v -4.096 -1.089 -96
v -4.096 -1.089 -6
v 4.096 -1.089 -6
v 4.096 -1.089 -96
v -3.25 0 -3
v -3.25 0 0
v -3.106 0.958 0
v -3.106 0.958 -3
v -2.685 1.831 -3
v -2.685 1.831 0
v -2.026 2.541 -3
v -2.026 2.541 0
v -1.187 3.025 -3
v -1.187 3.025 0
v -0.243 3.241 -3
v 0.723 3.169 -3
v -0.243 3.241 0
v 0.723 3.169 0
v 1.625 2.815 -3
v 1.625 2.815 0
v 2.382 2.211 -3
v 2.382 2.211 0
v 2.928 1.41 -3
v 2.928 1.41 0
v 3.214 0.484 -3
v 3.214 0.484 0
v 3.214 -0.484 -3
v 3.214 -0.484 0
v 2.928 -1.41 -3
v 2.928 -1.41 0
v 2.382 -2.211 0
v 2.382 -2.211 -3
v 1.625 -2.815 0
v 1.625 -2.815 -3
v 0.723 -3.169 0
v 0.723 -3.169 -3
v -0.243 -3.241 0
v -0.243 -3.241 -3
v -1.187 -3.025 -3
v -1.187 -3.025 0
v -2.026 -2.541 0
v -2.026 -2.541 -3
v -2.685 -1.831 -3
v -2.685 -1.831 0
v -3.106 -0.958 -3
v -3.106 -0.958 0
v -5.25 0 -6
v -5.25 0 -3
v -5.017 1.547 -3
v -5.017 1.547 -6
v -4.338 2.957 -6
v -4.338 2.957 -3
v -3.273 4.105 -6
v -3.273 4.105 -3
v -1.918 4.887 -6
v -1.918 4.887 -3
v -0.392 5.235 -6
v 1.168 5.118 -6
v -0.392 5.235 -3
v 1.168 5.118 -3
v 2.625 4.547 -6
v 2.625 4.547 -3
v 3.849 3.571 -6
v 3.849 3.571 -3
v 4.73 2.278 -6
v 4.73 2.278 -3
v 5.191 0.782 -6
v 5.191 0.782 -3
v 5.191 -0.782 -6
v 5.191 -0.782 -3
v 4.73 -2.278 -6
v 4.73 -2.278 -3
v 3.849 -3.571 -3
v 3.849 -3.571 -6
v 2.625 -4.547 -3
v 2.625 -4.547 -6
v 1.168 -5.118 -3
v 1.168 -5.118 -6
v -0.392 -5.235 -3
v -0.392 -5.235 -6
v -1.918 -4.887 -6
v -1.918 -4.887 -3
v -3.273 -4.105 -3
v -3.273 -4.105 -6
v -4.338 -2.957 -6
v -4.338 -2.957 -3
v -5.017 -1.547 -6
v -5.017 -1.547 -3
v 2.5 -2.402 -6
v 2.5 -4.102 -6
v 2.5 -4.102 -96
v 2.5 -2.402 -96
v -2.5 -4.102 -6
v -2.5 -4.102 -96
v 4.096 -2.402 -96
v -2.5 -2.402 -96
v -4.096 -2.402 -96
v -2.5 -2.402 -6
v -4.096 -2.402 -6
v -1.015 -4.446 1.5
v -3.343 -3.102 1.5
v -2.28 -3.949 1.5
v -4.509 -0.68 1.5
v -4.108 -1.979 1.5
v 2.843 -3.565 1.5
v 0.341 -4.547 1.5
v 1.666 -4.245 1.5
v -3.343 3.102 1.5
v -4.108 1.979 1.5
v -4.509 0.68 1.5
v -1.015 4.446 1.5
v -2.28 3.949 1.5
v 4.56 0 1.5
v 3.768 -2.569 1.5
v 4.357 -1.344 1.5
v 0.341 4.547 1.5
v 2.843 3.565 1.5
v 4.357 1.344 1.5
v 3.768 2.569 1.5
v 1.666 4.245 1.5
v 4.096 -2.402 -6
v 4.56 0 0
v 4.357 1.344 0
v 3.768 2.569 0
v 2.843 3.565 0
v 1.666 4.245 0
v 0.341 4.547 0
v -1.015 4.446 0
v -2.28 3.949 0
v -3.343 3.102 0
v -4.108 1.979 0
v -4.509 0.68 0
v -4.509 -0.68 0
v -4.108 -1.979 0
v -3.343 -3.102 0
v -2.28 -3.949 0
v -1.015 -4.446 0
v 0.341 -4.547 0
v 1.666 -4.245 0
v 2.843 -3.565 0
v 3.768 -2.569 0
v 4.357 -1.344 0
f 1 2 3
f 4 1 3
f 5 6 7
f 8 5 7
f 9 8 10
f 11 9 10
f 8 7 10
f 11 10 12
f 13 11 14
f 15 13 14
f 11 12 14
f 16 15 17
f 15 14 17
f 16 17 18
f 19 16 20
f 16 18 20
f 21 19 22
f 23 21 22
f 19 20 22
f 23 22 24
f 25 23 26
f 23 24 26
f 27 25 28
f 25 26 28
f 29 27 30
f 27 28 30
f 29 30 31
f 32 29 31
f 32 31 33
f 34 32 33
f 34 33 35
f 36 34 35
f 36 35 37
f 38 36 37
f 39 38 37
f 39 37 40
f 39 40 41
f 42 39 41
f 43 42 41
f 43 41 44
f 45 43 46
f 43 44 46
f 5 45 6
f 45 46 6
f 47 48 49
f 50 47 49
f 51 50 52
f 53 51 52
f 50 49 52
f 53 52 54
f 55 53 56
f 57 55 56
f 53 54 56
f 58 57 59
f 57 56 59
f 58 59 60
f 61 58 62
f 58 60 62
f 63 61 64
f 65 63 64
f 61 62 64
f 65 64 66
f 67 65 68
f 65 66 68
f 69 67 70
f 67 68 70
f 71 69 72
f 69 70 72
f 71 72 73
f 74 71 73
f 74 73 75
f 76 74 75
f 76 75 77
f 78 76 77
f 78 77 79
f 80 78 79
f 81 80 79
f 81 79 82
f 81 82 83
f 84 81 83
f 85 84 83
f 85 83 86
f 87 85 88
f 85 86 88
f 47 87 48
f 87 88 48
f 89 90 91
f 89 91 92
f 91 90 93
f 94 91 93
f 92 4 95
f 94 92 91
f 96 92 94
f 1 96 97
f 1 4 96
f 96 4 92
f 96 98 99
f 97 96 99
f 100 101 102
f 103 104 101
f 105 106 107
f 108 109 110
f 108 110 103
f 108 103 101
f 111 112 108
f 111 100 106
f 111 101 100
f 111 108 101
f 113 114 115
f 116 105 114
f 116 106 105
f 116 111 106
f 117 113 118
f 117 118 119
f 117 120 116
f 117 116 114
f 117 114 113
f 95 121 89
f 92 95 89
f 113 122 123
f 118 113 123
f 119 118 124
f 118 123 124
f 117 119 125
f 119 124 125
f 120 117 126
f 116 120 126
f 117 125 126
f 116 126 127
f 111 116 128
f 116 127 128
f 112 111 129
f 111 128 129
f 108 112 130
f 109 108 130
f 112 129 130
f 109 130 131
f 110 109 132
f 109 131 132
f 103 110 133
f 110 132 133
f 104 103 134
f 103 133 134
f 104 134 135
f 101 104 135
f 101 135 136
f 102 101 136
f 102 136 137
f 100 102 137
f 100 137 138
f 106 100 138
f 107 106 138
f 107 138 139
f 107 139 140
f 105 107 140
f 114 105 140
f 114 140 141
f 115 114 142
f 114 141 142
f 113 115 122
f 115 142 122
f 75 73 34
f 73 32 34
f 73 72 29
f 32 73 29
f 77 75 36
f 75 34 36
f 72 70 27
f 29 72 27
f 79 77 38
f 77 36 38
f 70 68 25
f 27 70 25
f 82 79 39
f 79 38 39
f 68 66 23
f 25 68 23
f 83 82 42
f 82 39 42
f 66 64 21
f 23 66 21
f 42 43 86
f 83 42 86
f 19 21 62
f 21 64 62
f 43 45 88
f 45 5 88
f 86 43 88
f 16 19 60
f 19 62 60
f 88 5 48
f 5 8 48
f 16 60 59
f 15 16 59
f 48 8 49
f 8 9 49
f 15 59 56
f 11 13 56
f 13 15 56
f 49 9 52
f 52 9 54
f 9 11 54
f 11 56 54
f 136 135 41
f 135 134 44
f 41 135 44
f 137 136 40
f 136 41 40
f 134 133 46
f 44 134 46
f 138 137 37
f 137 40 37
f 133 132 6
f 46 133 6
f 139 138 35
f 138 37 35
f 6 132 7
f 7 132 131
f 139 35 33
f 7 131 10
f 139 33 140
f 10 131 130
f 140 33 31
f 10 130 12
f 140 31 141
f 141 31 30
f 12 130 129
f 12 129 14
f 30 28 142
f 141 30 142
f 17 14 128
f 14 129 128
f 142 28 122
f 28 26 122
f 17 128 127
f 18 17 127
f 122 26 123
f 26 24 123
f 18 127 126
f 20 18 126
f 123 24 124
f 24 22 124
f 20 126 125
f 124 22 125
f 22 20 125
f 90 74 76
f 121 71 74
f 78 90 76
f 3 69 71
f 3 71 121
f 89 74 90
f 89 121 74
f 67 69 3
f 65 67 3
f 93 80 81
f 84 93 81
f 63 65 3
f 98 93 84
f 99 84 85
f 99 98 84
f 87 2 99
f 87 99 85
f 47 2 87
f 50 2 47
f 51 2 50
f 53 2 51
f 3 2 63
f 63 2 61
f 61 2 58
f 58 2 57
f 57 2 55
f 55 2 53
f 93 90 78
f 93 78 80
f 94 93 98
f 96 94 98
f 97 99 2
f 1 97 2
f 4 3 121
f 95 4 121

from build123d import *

# Parameters (mm, degrees)
CROQUIS1_R              = 4.56
SALIENTE_EXTRUIR4_DEPTH = 1.5
CROQUIS4_R              = 3.25
SALIENTE_EXTRUIR5_DEPTH = 3
CROQUIS5_R              = 5.25
SALIENTE_EXTRUIR6_DEPTH = 3
CROQUIS6_W              = 2.5
CROQUIS6_H              = 1.700541123
SALIENTE_EXTRUIR7_DEPTH = 90


with BuildPart() as part:
    # Croquis1 → Saliente-Extruir4 (new body)
    with BuildSketch(Plane.XY):
        Circle(CROQUIS1_R)
    extrude(amount=SALIENTE_EXTRUIR4_DEPTH)

    # Croquis4 → Saliente-Extruir5 (add)
    with BuildSketch(Plane(origin=(0, 0, 0), x_dir=(-1, 0, 0), z_dir=(0, 0, -1))):
        Circle(CROQUIS4_R)
    extrude(amount=SALIENTE_EXTRUIR5_DEPTH)

    # Croquis5 → Saliente-Extruir6 (add)
    with BuildSketch(Plane(origin=(0, 0, -3), x_dir=(-1, 0, 0), z_dir=(0, 0, -1))):
        Circle(CROQUIS5_R)
    extrude(amount=SALIENTE_EXTRUIR6_DEPTH)

    # Croquis6 → Saliente-Extruir7 (add)
    with BuildSketch(Plane(origin=(0, 0, -6), x_dir=(-1, 0, 0), z_dir=(0, 0, -1))):
        Polygon((0, -2.40164141), (0, -1.088943), (-4.096121931, -1.088943), (-4.096121931, -2.40164141), (-2.5, -2.40164141), align=None)
        Polygon((4.096121931, -1.088943), (0, -1.088943), (0, -2.40164141), (2.5, -2.40164141), (4.096121931, -2.40164141), align=None)
        with Locations((1.25, -3.251911972)):
            Rectangle(CROQUIS6_W, CROQUIS6_H)
        with Locations((-1.25, -3.251911972)):
            Rectangle(CROQUIS6_W, CROQUIS6_H)
    extrude(amount=SALIENTE_EXTRUIR7_DEPTH)


solid = part.part
